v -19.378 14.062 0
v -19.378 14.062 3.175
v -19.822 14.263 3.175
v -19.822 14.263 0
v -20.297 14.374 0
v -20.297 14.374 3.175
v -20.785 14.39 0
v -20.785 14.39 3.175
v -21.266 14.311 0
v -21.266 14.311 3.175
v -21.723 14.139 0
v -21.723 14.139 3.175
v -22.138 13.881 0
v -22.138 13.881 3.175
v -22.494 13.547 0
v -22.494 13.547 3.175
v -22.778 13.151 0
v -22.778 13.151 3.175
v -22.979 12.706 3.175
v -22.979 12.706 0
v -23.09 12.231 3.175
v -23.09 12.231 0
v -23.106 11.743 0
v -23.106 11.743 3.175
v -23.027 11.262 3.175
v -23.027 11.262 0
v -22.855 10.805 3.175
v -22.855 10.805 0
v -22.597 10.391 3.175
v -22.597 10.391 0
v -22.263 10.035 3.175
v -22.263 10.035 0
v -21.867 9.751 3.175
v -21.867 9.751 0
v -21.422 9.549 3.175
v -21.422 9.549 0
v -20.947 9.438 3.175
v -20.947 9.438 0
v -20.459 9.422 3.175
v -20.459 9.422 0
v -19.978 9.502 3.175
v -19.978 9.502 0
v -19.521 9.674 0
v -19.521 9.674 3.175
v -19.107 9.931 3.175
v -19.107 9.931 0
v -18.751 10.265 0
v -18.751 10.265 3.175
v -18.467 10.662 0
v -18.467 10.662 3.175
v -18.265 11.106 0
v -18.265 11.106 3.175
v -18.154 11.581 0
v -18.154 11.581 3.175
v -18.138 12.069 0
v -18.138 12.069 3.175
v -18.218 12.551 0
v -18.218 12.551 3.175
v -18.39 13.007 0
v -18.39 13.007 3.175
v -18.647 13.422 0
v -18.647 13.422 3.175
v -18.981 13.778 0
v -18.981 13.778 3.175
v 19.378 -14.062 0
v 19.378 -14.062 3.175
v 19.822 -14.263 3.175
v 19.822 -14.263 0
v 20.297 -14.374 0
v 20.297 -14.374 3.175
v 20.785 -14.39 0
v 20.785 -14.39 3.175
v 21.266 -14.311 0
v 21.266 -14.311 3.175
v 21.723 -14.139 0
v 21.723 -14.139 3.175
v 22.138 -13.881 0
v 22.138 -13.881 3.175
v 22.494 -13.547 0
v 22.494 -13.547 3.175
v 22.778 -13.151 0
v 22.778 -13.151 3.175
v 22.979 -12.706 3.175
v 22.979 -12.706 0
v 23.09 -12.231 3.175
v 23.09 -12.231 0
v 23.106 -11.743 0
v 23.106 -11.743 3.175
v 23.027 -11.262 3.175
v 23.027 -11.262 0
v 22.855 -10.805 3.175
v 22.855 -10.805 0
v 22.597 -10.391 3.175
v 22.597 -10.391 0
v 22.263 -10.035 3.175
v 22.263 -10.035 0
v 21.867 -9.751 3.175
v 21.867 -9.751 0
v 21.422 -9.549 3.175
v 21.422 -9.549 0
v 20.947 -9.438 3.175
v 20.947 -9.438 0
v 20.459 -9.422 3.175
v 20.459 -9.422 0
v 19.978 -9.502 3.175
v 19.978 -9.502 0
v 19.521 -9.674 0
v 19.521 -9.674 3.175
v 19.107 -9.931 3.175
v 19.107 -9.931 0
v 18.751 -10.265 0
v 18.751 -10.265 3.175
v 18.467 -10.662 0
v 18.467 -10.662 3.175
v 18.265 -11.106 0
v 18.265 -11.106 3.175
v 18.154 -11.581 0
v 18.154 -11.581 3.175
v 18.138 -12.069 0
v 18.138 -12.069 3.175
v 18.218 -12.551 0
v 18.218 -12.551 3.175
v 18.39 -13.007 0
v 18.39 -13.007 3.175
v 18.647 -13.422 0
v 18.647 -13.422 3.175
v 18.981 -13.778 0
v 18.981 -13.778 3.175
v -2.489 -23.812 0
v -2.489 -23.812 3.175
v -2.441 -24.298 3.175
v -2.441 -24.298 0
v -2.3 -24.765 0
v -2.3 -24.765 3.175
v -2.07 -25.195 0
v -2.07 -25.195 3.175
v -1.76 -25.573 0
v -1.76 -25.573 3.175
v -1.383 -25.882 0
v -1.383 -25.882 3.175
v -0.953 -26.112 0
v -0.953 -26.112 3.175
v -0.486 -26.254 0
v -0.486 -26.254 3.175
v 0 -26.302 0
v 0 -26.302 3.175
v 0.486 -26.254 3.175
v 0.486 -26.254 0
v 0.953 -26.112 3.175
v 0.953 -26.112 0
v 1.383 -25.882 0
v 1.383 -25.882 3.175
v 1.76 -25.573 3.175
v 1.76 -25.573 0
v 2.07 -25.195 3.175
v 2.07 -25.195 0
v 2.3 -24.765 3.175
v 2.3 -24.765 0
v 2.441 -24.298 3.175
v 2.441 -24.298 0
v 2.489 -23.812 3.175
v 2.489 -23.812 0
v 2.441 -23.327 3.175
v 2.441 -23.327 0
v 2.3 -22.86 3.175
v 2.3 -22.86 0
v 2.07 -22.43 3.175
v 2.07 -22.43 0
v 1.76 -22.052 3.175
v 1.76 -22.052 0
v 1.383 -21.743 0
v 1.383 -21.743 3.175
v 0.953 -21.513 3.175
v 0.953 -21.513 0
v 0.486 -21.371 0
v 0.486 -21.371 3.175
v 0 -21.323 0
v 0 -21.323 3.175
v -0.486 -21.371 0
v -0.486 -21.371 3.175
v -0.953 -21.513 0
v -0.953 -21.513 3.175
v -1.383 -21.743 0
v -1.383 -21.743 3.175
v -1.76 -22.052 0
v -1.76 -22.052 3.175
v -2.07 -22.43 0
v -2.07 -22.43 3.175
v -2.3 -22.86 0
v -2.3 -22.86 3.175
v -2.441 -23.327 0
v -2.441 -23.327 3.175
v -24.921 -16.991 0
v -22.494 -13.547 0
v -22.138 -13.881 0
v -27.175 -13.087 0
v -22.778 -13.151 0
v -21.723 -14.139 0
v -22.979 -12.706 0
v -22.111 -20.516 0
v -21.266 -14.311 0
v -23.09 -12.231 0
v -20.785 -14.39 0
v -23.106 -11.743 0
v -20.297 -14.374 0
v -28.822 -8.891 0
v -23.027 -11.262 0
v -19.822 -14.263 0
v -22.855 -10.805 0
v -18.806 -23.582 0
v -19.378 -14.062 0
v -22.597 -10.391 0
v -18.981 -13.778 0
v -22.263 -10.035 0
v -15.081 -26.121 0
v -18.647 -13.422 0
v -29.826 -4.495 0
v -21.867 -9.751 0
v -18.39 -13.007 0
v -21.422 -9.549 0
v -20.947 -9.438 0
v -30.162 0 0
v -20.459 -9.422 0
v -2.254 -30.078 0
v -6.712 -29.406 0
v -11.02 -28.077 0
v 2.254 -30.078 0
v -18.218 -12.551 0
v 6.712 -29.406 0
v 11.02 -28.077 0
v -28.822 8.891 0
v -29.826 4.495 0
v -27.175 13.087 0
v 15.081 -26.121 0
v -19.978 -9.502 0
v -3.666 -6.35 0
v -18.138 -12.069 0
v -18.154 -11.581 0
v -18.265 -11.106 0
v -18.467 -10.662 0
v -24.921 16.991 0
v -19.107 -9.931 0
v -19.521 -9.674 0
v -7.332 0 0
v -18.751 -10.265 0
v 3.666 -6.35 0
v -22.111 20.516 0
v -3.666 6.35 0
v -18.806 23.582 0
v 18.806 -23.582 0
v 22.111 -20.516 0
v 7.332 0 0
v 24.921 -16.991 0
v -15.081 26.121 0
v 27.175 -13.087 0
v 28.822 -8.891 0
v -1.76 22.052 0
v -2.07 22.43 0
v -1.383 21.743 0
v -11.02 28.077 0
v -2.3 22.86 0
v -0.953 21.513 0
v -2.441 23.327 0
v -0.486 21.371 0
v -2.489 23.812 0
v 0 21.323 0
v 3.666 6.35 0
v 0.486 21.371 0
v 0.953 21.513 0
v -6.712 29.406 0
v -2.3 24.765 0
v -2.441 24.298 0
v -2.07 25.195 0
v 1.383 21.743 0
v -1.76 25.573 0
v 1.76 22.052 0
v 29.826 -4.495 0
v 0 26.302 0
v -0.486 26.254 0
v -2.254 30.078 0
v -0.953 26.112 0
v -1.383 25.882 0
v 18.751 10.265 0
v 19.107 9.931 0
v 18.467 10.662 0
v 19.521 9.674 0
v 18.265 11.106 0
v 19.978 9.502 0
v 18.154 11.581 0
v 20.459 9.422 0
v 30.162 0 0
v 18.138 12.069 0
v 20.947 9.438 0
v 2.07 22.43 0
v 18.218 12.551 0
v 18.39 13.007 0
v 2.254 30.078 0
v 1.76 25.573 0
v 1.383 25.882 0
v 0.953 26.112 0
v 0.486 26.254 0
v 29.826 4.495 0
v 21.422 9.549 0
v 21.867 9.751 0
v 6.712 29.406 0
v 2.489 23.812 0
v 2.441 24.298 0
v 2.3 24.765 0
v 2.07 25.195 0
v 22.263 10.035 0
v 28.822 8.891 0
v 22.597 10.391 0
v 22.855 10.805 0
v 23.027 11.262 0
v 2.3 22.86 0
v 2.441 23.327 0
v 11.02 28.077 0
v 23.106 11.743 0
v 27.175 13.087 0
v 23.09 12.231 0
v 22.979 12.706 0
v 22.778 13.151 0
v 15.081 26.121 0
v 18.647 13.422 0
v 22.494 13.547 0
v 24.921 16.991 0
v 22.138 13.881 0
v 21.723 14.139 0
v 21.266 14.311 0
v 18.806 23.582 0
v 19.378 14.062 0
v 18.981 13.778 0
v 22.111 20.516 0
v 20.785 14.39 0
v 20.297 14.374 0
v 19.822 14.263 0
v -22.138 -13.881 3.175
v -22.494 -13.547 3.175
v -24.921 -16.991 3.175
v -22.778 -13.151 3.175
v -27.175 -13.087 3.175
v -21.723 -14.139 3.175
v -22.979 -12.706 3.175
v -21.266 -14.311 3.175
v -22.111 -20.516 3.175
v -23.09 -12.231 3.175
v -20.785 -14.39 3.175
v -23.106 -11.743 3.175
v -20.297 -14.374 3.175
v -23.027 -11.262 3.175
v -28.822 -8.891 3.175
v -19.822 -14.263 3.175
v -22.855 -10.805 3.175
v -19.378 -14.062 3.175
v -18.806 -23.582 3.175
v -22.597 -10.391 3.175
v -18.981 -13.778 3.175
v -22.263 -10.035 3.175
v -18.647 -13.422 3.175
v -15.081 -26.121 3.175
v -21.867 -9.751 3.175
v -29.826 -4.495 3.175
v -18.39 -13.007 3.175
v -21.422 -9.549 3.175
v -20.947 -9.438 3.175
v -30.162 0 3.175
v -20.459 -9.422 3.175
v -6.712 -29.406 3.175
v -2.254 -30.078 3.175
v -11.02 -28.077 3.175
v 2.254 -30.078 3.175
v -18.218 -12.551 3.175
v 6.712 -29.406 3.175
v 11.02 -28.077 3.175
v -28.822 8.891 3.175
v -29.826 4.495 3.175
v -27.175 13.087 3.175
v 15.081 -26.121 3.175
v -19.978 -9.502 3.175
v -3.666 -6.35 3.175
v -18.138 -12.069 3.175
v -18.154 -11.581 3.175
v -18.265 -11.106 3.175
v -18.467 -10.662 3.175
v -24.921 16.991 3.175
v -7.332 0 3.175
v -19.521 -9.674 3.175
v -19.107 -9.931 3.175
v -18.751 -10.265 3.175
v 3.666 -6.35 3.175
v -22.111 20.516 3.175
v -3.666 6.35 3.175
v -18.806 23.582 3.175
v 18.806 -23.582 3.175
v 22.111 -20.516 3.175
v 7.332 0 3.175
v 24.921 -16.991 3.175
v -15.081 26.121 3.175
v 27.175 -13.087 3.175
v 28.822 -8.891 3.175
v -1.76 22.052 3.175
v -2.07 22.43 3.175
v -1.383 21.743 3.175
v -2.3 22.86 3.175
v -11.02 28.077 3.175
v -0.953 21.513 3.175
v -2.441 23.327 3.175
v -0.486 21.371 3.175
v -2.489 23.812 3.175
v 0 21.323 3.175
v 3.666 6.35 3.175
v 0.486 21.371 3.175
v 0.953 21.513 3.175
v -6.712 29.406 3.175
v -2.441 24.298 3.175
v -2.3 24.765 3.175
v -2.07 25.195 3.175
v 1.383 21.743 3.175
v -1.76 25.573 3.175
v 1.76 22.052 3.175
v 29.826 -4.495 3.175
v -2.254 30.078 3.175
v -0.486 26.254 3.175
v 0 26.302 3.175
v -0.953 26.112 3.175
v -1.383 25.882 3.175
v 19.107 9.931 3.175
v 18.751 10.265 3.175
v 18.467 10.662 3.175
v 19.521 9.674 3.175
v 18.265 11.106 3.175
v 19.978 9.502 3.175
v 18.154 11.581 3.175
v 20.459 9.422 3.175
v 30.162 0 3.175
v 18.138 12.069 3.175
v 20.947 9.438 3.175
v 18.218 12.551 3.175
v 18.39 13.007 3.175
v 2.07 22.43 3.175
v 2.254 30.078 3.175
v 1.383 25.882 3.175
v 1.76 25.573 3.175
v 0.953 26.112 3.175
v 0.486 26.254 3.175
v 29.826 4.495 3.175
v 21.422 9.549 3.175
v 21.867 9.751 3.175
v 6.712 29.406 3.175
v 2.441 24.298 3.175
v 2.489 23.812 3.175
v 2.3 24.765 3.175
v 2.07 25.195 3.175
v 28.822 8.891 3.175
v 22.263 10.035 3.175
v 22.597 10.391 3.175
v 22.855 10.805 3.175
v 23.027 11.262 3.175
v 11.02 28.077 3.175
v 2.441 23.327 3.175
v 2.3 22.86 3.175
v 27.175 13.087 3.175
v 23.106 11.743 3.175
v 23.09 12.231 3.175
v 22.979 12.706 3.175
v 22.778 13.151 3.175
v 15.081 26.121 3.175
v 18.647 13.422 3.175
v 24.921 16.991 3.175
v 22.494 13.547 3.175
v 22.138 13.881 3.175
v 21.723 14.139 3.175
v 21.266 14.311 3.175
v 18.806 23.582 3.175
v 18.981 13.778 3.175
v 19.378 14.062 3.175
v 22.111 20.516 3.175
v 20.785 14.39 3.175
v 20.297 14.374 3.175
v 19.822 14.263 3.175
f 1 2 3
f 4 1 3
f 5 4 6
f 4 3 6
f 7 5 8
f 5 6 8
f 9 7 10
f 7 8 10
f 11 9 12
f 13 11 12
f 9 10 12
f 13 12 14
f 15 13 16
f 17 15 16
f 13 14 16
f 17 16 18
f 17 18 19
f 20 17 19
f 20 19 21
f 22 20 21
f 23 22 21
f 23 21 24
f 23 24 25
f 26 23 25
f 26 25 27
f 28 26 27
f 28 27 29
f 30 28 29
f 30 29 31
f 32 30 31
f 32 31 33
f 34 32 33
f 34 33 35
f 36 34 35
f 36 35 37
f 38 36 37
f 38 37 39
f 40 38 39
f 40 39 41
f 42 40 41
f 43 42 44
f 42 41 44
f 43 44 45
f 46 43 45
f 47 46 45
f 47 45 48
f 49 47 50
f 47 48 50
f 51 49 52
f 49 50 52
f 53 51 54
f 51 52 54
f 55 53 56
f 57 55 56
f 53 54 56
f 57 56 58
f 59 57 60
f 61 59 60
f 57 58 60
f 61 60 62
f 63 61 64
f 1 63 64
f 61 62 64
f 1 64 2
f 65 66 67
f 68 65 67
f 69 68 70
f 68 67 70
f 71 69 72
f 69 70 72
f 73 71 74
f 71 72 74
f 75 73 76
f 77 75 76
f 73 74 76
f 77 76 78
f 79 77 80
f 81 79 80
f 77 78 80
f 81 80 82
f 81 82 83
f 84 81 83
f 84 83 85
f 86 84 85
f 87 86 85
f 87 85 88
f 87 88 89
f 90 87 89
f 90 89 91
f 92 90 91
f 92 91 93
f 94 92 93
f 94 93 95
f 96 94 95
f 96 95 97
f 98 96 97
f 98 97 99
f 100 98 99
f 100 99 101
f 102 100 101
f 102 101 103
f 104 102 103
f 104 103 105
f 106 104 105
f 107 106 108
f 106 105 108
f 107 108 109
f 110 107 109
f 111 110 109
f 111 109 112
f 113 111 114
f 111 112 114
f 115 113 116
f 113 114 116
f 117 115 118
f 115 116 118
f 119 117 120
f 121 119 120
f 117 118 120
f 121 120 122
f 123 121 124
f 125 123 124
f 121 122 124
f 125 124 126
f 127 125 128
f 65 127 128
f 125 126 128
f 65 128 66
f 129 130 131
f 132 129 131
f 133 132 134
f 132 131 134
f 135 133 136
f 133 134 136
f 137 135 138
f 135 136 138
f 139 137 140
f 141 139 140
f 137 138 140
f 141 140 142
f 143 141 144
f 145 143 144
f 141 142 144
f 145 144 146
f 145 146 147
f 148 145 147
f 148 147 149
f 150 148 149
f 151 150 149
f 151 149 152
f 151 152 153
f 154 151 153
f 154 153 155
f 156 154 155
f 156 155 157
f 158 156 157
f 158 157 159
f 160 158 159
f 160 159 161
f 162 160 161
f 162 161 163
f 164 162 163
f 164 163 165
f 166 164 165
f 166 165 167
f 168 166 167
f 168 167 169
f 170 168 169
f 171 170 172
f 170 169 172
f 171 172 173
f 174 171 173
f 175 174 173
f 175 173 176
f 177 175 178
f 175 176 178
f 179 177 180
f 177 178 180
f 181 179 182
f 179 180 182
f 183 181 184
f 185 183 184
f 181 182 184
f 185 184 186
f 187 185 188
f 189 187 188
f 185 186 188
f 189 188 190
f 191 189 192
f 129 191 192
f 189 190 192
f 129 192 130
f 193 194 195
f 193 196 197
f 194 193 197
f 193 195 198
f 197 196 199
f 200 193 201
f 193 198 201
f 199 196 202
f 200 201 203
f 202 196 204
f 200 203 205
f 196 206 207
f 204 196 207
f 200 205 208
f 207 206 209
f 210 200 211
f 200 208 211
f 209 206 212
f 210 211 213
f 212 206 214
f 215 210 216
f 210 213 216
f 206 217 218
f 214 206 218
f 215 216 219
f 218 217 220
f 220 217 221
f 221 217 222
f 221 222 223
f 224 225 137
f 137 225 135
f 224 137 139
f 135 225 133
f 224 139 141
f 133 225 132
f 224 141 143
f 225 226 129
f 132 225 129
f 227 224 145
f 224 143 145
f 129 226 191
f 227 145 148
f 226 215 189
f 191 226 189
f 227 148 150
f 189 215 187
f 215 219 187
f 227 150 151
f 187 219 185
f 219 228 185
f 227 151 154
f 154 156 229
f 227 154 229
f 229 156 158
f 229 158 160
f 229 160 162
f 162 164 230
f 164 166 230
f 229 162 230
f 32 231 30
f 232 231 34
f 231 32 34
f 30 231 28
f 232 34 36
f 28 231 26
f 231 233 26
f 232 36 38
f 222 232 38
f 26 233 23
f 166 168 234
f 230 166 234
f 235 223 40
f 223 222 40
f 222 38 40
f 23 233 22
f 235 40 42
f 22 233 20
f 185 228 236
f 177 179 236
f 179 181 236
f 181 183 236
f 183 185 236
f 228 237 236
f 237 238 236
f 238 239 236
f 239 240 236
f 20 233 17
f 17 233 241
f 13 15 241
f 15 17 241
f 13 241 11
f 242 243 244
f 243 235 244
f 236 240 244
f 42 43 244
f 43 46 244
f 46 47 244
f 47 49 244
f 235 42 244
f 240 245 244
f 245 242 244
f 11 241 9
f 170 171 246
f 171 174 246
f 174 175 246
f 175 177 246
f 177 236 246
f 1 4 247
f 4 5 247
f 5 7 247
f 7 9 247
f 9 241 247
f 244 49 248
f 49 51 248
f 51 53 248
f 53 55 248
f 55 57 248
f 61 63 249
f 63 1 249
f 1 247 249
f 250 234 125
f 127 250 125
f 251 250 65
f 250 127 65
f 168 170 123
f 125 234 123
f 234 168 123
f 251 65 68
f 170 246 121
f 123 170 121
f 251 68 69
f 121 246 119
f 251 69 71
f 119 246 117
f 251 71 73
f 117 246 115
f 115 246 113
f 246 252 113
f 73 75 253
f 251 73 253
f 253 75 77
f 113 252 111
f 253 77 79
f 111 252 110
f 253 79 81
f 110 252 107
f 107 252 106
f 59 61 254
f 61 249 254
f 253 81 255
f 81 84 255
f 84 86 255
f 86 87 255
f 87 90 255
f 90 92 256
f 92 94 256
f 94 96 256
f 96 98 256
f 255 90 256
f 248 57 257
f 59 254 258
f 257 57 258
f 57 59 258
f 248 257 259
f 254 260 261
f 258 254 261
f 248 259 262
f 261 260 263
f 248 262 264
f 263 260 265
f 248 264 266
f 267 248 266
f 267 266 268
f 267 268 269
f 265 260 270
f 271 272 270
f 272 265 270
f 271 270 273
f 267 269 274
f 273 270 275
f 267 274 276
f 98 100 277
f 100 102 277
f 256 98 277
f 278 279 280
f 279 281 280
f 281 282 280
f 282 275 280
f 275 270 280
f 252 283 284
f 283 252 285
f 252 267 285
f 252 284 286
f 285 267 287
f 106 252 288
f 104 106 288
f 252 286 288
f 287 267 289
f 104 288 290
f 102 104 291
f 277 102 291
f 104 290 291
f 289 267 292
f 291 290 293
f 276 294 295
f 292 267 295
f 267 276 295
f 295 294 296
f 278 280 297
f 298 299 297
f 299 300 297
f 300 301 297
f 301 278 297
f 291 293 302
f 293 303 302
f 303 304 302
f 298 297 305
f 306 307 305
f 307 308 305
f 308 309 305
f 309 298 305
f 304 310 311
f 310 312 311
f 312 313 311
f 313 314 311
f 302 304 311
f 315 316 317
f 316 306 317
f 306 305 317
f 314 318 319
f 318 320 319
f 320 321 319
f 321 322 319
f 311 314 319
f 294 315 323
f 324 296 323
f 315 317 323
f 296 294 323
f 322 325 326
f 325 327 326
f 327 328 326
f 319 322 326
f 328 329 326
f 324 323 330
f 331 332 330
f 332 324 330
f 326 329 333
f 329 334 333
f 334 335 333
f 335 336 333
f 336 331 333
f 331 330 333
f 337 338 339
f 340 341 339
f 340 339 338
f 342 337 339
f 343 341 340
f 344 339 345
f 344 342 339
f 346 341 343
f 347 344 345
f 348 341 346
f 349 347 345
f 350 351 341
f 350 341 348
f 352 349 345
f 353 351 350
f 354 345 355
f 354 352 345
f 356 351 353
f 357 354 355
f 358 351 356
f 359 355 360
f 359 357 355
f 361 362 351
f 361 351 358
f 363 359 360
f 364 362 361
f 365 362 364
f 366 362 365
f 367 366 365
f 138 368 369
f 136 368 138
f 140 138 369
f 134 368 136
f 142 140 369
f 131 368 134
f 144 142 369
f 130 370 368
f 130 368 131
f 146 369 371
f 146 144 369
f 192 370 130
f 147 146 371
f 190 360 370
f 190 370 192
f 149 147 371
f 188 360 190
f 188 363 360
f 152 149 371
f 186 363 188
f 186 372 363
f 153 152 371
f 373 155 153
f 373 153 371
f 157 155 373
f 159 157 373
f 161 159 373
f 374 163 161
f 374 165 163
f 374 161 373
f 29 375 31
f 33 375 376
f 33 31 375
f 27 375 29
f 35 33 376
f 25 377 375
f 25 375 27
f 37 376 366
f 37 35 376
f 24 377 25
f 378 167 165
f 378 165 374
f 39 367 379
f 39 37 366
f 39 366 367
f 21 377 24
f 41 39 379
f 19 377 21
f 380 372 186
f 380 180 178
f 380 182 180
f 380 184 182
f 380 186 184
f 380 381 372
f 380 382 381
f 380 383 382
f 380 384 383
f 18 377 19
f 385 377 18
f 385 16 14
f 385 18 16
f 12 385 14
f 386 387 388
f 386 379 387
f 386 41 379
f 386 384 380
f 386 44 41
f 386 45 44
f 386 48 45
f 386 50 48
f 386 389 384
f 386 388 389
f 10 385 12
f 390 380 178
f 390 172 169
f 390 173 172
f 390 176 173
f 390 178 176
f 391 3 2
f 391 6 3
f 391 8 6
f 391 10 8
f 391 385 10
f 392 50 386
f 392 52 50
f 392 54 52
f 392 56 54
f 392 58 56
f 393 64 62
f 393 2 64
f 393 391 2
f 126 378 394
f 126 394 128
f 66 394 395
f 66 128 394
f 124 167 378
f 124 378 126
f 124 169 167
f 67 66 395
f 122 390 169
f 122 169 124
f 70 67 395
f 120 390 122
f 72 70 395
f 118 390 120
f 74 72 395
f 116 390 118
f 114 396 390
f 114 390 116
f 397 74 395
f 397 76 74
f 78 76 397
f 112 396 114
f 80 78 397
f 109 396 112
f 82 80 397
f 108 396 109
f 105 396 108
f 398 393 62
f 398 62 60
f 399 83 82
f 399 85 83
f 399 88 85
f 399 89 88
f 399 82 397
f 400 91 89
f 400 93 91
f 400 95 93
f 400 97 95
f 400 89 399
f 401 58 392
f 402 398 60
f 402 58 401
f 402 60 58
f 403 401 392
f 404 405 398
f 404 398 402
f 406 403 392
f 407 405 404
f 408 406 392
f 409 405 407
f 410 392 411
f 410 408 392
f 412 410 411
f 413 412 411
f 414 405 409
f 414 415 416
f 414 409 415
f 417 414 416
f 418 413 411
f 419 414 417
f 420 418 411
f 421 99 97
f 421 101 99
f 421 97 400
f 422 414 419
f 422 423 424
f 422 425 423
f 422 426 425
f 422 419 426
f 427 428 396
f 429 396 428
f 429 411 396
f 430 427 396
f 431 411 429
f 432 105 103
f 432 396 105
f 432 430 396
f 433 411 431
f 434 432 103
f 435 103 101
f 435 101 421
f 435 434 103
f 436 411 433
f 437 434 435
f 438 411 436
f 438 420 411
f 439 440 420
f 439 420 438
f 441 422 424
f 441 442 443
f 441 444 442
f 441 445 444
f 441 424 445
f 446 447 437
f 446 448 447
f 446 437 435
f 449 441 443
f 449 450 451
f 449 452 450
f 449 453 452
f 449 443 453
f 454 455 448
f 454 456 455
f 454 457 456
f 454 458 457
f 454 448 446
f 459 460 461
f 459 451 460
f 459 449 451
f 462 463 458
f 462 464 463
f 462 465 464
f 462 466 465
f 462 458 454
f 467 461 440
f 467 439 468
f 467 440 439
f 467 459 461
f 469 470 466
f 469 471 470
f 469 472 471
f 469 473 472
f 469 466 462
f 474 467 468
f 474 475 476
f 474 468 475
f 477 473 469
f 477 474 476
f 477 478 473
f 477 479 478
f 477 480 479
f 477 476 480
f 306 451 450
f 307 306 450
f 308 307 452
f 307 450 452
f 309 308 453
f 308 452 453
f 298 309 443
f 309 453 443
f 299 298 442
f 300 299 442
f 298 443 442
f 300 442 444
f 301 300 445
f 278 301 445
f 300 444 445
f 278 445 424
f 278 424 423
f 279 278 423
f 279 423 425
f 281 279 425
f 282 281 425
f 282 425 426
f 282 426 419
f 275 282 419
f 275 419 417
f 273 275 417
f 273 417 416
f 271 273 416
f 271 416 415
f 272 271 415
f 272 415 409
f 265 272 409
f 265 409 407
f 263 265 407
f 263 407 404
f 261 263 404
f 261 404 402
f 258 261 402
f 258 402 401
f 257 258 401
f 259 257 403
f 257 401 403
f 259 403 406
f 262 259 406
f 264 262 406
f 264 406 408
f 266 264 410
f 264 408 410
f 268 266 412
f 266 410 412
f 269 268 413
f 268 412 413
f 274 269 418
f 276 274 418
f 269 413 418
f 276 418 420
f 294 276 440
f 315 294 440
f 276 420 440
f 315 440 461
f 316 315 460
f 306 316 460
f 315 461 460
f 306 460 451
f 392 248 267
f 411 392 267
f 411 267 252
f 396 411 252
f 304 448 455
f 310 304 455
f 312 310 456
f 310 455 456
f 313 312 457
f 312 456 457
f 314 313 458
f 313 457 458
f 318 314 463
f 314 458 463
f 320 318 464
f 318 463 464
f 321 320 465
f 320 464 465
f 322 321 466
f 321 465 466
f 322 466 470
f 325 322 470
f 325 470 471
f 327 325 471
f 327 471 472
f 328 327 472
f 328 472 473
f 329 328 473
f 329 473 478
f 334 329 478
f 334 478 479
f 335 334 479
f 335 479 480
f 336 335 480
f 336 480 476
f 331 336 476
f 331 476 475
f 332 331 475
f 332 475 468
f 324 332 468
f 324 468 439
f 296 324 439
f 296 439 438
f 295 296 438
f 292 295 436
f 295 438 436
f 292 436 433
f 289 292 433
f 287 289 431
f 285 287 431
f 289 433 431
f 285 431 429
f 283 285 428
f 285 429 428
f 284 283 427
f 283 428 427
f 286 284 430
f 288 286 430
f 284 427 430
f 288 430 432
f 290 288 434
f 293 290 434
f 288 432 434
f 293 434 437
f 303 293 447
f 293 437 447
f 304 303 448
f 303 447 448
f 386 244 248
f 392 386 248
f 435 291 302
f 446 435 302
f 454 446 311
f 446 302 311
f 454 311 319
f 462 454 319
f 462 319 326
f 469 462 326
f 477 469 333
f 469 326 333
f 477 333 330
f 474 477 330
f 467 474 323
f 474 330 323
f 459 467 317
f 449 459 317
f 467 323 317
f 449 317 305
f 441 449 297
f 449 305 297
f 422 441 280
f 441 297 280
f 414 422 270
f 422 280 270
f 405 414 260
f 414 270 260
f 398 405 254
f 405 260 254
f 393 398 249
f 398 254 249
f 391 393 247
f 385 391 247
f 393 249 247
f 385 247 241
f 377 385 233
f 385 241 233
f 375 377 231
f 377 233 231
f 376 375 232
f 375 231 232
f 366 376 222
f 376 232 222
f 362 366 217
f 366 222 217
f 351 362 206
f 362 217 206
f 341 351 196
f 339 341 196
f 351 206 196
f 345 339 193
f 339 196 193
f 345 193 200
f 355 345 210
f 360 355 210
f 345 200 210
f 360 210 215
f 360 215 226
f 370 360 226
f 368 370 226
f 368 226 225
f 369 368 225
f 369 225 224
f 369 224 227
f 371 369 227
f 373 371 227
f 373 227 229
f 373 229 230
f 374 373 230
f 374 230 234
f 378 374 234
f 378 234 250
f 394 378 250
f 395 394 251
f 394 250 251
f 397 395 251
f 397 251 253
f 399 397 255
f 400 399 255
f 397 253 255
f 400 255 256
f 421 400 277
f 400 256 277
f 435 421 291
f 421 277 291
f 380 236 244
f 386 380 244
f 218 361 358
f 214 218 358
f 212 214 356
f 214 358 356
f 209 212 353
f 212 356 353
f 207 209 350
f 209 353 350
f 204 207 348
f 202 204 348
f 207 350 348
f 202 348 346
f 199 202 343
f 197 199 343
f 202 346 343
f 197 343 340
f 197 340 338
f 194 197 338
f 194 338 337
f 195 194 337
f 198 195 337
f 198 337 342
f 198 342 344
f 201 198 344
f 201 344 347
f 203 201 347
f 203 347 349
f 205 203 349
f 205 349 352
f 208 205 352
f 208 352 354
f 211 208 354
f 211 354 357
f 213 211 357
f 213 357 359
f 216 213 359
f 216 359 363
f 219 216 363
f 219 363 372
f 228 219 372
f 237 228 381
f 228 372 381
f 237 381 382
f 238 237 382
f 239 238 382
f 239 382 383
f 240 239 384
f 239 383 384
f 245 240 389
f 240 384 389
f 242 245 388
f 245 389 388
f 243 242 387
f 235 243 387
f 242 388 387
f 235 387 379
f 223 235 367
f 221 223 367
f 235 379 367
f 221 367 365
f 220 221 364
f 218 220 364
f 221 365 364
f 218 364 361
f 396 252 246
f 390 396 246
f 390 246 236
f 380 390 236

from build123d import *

# Parameters (mm, degrees)
F0_R            = 30.1625
F1_DEPTH        = 3.175
F2_R            = 2.4892
F3_DEPTH        = 3.176
F3_COPIES_COUNT = 6
F4_R            = 2.3622
F5_DEPTH        = 3.176


# Not quite as in the source:
# - a pattern or mirror of a feature is missing from the dataset's text; its kind, count and spacing are read off the source's solid


with BuildPart() as f1:
    # F0 (on Top) → F1 (new body)
    with BuildSketch(Plane.XY):
        Circle(F0_R)
        Polygon((7.3323484187, 0), (3.6661742094, -6.35), (-3.6661742094, -6.35), (-7.3323484187, 0), (-3.6661742094, 6.35), (3.6661742094, 6.35), align=None, mode=Mode.SUBTRACT)
    extrude(amount=F1_DEPTH)

    # F2 (on face) → F3 (cut, through all)
    with BuildSketch(Plane.XY.offset(3.175)):
        with Locations((0, 23.8125)):
            Circle(F2_R)
    f3 = extrude(amount=-F3_DEPTH, mode=Mode.SUBTRACT)

    # F3_copies: F3 ×6 about axis
    f3_copies_axis = Axis((0, 0, 0), (0, 0, 1))
    for i in range(1, F3_COPIES_COUNT):
        add(f3.rotate(f3_copies_axis, i * 360 / F3_COPIES_COUNT), mode=Mode.SUBTRACT)

    # F4 (on face) → F5 (cut, through all)
    with BuildSketch(Plane.XY.offset(3.175)):
        with Locations((0, 40.2743678674)):
            Circle(F4_R)
        with Locations((38.3032, 12.4454641087)):
            Circle(F4_R)
        with Locations((23.6726794779, -32.5826480425)):
            Circle(F4_R)
        with Locations((-23.6726794779, -32.5826480425)):
            Circle(F4_R)
        with Locations((-38.3032, 12.4454641087)):
            Circle(F4_R)
    extrude(amount=-F5_DEPTH, mode=Mode.SUBTRACT)


solid = f1.part
